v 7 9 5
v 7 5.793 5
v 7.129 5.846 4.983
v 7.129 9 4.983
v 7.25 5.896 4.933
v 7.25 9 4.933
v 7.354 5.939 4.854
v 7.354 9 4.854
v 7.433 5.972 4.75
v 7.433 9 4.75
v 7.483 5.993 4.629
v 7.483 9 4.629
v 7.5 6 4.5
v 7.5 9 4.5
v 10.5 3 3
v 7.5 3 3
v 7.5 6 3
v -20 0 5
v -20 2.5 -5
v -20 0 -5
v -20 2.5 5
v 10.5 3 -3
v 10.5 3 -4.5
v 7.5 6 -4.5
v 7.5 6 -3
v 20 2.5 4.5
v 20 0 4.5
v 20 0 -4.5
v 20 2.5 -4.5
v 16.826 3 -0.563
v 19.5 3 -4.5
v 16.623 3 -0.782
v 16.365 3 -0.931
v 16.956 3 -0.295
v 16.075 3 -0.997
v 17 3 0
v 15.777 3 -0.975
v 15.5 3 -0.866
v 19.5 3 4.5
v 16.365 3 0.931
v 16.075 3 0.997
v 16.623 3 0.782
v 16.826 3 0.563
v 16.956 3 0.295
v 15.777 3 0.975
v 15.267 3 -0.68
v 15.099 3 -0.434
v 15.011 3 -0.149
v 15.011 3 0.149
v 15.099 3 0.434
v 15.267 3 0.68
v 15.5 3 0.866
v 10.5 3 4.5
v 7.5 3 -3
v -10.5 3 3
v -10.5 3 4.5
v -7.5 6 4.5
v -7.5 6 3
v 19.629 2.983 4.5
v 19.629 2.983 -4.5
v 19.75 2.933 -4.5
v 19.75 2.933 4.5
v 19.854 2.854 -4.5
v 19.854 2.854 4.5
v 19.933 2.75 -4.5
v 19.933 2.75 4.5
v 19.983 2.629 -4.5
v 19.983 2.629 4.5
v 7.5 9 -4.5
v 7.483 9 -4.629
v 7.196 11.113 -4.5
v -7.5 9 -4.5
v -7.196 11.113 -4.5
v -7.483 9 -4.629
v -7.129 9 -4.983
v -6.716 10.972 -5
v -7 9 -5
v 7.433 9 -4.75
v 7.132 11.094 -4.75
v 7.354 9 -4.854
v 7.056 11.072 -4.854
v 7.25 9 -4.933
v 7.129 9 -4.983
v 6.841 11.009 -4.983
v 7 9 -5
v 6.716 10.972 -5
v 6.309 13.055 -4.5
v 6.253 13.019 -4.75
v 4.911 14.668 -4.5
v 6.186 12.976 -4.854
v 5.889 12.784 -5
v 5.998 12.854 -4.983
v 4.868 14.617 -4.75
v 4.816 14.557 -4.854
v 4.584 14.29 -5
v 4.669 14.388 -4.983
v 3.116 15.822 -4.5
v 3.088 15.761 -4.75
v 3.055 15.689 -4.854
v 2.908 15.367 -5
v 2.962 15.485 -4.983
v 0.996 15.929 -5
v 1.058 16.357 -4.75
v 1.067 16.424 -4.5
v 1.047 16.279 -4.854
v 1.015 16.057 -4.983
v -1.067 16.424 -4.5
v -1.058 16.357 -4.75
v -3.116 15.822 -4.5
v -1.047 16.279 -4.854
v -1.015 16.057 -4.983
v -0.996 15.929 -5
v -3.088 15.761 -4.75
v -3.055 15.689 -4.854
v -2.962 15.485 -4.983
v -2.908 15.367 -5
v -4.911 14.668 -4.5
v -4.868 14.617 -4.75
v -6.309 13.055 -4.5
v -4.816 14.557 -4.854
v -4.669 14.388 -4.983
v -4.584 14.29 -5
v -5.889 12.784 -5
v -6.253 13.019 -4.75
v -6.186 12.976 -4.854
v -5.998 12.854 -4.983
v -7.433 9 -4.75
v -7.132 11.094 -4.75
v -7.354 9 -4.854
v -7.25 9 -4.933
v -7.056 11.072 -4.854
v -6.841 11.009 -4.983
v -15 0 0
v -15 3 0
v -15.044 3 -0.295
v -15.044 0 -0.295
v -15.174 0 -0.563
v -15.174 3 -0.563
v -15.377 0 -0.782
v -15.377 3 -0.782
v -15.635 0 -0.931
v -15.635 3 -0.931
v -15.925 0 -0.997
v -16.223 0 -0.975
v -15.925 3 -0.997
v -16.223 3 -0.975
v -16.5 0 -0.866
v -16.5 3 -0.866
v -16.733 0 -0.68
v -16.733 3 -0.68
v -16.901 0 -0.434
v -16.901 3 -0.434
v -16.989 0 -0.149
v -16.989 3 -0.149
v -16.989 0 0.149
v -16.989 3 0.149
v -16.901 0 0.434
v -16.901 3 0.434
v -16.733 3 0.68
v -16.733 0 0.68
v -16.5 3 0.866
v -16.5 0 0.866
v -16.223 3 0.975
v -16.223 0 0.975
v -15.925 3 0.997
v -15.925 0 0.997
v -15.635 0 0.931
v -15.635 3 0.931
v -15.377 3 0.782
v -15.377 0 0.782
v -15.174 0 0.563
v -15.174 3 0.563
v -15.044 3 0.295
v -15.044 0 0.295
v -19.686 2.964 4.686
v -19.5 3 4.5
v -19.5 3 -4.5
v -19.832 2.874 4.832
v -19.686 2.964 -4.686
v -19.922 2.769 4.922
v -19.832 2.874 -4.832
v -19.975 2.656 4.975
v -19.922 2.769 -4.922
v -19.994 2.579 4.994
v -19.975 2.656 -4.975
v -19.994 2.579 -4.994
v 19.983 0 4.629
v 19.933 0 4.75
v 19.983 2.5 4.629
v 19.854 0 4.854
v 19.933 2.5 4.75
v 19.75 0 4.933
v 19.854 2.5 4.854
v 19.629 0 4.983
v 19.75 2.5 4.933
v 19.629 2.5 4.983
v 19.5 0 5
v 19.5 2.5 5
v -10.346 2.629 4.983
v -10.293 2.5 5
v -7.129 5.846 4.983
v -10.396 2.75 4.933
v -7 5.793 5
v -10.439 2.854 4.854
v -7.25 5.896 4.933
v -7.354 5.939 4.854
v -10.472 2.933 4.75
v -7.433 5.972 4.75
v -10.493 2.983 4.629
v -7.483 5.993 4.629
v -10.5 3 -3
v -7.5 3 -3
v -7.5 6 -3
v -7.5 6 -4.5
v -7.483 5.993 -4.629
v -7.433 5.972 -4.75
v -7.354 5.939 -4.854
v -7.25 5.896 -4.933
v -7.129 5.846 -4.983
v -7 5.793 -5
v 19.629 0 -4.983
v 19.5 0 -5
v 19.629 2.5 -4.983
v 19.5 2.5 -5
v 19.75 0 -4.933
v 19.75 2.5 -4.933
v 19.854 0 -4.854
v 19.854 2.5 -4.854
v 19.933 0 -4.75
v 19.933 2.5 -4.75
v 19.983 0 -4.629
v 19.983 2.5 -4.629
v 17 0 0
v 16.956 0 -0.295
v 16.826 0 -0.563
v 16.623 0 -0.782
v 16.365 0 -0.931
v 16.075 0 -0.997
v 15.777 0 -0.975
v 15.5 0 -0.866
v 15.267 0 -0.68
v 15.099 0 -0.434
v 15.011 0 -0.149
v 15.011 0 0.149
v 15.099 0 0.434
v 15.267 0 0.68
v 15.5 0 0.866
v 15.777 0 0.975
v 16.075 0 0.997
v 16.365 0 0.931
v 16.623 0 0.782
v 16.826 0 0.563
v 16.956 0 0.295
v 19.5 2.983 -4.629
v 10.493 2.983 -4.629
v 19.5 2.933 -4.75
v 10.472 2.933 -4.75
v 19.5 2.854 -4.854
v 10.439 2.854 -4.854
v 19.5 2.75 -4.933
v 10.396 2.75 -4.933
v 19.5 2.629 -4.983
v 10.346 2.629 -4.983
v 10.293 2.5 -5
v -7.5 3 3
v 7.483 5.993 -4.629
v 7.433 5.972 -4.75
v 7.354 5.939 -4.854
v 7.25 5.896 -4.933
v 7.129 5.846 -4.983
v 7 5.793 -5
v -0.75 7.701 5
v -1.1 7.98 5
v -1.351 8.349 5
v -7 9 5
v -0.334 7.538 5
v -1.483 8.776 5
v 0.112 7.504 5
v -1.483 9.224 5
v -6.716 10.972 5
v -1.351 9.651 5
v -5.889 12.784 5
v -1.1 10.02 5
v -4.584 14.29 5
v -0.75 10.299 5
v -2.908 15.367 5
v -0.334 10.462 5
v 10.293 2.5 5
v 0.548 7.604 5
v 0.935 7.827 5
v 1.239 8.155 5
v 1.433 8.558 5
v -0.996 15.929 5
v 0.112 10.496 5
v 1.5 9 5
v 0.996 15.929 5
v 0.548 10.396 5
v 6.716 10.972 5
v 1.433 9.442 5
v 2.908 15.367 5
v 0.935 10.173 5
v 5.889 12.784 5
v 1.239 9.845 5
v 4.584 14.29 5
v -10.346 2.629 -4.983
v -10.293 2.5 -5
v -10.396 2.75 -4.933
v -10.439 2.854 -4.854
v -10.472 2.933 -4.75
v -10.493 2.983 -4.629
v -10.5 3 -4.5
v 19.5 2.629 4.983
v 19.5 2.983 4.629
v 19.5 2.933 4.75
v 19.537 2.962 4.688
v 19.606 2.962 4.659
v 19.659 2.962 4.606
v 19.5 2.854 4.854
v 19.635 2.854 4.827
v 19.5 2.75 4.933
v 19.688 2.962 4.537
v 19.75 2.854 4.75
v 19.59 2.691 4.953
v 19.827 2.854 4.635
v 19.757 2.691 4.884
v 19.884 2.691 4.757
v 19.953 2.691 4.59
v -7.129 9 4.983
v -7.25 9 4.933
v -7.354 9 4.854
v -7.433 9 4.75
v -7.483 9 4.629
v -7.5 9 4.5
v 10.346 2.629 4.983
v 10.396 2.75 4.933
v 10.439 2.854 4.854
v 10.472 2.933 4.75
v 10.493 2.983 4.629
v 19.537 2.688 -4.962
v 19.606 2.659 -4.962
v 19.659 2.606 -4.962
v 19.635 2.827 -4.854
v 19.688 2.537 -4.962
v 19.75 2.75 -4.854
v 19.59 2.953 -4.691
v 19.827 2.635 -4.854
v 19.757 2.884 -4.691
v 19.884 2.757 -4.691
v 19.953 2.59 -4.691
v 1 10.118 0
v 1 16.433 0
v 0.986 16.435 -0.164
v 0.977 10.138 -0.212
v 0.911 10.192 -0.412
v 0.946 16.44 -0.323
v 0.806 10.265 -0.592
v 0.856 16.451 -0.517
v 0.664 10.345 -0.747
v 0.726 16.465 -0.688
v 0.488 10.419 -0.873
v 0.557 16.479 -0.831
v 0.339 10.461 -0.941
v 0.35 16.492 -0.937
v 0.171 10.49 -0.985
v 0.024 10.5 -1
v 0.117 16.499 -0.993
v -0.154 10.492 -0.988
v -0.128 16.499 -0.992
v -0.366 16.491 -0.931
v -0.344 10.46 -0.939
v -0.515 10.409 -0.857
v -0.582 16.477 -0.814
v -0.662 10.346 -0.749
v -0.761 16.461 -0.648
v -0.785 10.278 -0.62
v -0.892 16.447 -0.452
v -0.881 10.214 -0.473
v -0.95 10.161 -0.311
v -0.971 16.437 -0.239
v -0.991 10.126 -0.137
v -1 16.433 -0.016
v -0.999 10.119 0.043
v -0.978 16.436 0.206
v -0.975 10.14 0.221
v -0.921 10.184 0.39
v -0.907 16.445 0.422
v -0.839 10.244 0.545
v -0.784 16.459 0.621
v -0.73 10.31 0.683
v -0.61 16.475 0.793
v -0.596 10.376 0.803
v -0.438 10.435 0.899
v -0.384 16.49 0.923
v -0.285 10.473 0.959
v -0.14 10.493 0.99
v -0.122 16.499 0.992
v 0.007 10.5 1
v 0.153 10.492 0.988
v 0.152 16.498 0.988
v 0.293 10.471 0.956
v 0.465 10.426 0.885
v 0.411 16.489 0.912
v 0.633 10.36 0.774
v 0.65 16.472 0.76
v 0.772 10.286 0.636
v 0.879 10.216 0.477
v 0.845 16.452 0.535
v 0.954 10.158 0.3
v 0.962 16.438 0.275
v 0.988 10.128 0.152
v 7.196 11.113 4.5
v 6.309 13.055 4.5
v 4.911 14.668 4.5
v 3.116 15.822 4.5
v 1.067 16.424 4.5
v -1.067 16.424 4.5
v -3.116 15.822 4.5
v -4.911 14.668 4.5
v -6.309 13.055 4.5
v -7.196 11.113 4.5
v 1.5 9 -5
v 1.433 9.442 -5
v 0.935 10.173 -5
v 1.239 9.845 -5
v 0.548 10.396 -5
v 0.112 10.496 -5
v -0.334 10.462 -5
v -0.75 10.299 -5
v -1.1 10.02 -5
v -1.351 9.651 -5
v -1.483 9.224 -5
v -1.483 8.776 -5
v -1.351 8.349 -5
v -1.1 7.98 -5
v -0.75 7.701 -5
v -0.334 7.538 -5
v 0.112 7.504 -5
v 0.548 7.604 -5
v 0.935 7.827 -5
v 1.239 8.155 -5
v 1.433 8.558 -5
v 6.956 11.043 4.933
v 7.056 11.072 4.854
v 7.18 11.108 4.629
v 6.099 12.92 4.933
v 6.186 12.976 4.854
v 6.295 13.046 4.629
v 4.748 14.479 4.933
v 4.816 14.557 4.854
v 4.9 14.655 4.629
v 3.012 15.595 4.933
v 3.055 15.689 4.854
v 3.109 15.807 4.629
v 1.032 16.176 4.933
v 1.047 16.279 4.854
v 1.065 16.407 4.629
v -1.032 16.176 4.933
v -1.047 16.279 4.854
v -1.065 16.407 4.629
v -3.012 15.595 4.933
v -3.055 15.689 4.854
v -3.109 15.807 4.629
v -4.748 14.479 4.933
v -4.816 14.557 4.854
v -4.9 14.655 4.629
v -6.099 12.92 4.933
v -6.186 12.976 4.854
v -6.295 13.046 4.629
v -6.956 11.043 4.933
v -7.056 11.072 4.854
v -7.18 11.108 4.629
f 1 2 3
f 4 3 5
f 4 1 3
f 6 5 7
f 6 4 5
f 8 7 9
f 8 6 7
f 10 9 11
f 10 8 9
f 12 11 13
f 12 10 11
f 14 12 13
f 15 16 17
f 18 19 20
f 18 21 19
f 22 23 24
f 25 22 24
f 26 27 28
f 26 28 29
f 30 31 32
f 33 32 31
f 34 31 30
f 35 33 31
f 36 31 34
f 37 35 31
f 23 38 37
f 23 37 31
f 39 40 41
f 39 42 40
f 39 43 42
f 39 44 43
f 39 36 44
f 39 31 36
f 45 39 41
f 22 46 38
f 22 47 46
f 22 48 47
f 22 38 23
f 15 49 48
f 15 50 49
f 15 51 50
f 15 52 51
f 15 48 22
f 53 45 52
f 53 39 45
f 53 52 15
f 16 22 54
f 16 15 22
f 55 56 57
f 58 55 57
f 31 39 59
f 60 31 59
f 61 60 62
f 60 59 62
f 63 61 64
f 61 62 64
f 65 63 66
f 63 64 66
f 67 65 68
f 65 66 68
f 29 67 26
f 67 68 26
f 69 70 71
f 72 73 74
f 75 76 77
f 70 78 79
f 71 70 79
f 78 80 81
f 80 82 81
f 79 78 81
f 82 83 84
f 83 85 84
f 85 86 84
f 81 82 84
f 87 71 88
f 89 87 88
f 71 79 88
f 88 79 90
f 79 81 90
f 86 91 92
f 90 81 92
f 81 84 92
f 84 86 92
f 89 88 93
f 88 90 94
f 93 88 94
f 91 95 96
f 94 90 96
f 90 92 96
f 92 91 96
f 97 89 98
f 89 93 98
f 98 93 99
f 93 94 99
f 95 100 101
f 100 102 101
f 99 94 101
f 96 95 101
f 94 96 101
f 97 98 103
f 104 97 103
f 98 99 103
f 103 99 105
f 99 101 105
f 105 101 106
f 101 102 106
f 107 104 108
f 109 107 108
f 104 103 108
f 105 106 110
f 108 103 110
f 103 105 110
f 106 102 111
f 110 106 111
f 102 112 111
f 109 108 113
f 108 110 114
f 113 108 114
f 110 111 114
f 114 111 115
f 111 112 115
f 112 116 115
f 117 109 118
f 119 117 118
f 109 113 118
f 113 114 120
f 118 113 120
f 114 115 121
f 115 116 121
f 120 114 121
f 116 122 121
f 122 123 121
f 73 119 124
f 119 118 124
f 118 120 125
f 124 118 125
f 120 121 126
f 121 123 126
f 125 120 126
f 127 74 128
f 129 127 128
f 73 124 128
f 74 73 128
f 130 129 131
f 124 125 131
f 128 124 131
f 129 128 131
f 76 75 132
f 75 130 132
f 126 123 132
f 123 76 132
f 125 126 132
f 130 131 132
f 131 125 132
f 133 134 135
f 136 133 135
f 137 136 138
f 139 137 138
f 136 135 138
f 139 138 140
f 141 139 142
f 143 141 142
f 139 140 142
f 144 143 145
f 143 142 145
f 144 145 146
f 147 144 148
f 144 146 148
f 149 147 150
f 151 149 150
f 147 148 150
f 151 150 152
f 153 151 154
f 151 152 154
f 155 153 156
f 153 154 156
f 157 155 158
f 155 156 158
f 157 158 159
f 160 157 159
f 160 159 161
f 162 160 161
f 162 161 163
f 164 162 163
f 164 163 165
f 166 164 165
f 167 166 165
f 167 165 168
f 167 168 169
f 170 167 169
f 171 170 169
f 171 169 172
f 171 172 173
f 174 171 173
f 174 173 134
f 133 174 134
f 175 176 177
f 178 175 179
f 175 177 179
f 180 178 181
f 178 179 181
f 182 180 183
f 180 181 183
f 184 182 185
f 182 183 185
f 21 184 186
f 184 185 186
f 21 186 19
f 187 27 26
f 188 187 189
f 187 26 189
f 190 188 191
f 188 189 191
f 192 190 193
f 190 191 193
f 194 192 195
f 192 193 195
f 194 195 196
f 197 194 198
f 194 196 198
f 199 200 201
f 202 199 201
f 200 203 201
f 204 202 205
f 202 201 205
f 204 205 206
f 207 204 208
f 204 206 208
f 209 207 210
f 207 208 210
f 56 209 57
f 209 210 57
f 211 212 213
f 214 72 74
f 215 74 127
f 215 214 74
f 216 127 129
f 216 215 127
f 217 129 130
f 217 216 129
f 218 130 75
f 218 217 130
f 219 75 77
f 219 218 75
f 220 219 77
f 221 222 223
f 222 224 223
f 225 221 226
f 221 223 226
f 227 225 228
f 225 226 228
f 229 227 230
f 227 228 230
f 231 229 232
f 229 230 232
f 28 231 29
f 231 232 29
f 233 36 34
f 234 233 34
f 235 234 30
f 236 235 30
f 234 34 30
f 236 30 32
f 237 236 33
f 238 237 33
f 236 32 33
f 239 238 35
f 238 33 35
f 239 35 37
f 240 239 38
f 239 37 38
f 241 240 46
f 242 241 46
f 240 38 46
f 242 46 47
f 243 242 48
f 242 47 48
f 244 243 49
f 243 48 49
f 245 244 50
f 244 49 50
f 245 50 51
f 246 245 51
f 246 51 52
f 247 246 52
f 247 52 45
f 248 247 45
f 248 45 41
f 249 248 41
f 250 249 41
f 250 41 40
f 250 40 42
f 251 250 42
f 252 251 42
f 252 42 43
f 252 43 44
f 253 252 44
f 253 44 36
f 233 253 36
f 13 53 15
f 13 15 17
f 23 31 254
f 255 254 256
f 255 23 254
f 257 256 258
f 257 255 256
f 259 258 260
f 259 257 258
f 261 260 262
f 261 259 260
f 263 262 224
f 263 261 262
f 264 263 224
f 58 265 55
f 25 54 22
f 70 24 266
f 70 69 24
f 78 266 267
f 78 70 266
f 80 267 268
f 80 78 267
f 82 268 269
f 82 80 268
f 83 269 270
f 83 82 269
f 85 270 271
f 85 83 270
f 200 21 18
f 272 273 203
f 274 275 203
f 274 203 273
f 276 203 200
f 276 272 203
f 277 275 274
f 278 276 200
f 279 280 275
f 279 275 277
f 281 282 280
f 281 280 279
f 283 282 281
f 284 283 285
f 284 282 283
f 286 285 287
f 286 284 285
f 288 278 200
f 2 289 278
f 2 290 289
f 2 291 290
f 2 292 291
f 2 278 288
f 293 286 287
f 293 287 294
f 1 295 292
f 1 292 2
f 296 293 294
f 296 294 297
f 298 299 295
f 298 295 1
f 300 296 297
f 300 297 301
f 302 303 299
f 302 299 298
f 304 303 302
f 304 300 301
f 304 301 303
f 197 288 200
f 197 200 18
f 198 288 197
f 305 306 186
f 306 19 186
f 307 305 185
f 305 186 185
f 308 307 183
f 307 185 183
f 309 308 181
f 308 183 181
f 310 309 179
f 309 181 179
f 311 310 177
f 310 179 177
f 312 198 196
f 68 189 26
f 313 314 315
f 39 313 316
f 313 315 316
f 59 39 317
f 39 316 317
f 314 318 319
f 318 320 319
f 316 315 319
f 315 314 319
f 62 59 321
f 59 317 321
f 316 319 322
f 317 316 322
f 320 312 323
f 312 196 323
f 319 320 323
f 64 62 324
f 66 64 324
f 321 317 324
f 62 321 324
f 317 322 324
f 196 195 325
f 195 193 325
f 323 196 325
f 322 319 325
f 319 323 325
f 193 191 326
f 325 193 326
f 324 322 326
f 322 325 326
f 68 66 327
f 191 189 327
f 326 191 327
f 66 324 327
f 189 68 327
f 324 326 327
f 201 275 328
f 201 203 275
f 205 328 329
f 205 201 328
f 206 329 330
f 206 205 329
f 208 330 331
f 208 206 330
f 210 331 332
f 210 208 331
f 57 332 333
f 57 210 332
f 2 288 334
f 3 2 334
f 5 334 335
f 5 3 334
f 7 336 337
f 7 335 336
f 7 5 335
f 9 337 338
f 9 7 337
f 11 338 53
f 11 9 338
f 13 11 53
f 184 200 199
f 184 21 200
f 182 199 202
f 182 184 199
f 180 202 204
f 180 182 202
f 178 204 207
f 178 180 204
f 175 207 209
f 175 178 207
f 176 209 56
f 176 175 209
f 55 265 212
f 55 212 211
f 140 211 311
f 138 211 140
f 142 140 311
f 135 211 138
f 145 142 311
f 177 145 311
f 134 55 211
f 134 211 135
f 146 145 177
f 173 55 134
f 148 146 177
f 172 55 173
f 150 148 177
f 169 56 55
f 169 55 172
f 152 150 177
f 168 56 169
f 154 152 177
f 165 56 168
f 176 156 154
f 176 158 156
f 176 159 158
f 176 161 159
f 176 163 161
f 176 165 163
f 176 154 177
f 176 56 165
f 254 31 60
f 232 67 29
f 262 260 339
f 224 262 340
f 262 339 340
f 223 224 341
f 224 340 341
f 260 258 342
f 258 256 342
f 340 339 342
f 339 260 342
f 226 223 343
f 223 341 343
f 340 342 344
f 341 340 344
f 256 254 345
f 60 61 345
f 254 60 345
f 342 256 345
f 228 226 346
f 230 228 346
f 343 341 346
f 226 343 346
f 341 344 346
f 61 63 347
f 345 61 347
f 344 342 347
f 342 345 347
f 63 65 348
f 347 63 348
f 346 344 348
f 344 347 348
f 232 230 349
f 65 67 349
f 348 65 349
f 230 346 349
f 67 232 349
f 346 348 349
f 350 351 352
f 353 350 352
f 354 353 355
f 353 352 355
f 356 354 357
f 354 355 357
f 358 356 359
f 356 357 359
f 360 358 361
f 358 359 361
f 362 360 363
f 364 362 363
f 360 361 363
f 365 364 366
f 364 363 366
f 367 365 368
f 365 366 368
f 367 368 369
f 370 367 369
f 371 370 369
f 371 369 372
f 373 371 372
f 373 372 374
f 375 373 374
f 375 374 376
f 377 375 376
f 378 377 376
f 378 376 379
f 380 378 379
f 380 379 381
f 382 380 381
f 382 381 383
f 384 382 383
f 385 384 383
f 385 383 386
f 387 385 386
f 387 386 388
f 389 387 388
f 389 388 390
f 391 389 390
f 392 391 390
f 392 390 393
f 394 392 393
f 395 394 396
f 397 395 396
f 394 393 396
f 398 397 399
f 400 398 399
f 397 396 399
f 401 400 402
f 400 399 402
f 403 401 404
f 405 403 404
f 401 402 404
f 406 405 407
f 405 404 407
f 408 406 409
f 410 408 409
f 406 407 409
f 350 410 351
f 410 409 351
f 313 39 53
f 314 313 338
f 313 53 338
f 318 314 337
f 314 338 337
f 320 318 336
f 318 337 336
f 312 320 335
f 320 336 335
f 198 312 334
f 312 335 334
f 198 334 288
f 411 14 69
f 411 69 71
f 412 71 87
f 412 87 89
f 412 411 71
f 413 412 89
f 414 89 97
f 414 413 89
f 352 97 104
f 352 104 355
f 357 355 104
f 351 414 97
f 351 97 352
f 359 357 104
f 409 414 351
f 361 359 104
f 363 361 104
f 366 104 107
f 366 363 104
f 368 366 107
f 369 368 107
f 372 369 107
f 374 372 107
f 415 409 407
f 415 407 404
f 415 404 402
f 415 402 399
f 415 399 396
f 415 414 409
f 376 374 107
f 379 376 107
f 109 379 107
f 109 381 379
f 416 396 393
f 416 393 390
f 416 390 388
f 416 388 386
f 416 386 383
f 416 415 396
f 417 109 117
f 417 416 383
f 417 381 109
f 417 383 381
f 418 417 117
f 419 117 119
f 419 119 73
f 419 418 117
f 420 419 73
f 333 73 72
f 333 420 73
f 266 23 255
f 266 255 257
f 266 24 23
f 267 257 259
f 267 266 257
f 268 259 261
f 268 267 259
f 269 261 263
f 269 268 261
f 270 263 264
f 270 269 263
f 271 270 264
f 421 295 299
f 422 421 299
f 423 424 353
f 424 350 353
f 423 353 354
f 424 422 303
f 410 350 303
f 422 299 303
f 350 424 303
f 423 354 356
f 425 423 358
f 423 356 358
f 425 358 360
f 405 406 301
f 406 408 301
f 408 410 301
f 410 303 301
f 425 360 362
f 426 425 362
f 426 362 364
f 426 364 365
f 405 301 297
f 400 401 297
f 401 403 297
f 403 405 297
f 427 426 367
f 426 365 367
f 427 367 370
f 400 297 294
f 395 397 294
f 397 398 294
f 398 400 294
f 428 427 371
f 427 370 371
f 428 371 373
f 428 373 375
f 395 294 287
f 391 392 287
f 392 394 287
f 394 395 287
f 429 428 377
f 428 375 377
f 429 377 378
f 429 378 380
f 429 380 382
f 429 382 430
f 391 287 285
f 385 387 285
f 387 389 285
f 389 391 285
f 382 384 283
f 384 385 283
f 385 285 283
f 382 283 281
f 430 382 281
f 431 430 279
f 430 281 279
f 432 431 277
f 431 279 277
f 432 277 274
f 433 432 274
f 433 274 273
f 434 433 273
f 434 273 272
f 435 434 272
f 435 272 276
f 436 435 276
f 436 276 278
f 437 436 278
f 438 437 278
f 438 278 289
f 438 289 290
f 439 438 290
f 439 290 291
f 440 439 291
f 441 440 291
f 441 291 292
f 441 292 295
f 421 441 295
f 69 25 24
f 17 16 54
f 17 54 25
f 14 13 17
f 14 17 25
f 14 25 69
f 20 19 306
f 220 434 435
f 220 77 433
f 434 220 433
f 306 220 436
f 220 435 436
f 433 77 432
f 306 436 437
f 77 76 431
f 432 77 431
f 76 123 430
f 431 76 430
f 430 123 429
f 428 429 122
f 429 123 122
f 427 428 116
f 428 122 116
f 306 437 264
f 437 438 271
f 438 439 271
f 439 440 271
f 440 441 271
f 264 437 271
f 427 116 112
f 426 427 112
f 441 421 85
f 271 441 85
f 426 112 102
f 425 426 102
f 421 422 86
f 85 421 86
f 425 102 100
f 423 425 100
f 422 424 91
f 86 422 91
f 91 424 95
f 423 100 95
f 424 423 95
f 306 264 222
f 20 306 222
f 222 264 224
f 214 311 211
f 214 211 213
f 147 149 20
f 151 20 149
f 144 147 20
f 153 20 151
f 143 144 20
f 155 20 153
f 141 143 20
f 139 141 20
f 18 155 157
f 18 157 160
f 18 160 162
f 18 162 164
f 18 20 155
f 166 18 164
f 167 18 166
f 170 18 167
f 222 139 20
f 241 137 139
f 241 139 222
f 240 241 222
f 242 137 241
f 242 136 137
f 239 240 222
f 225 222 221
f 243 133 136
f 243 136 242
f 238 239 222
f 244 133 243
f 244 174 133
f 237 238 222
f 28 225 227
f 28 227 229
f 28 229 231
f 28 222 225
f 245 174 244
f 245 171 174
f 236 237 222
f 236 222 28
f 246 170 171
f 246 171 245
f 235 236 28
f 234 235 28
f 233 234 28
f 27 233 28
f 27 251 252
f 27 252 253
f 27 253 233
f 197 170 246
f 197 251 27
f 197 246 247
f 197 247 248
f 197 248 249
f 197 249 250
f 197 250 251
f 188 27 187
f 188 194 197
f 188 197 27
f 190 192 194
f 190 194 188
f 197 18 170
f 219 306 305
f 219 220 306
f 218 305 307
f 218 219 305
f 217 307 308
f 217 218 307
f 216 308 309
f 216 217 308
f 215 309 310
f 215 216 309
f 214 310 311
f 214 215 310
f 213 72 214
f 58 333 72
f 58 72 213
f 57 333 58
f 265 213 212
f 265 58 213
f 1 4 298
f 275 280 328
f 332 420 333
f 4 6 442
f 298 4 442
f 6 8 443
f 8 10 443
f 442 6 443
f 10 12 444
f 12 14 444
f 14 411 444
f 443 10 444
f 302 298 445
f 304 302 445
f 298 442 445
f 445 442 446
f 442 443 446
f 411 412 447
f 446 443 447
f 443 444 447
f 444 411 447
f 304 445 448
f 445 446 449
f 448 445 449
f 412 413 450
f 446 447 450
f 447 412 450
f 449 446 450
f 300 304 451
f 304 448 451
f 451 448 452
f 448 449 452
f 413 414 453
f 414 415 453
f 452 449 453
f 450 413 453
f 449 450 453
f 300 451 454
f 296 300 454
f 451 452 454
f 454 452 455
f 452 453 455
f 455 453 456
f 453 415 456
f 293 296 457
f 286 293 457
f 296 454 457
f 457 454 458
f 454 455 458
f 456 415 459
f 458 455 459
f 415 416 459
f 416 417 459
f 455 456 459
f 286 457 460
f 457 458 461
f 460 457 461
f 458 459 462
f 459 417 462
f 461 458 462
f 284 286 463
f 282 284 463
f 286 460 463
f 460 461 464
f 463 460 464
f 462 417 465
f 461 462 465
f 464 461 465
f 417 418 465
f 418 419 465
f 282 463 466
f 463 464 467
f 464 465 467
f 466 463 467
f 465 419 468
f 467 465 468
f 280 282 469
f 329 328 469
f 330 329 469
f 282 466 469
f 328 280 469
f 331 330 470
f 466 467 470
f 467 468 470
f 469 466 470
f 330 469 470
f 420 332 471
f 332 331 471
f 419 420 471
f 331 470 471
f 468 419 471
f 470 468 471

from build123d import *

# Parameters (mm, degrees)
BOSS_EXTRU_1_DEPTH           = 5
BOSS_EXTRU_2_DEPTH           = 2
SYM_TRIE2_COPY_1_DEPTH       = 2
CONG_1_R                     = 0.5
ESQUISSE4_R                  = 1.5
ENL_V_MAT_EXTRU_2_DEPTH      = 1.0000001
ENL_V_MAT_EXTRU_2_DEPTH_BACK = 11.0000001
ESQUISSE5_R                  = 1
ENL_V_MAT_EXTRU_3_DEPTH      = 7
ESQUISSE3_R                  = 1
ENL_V_MAT_EXTRU_1_DEPTH      = 14.500000115
ENL_V_MAT_EXTRU_1_DEPTH_BACK = 4


with BuildPart() as part:
    # Esquisse1 → Boss.-Extru.1 (new body, symmetric)
    with BuildSketch(Plane.XY):
        with BuildLine():
            Line((-20, 0), (20, 0))
            Line((20, 0), (20, 3))
            Line((20, 3), (7.5, 3))
            Line((7.5, 3), (7.5, 9))
            ThreePointArc((7.5, 9), (0, 16.5), (-7.5, 9))
            Line((-7.5, 9), (-7.5, 3))
            Line((-7.5, 3), (-20, 3))
            Line((-20, 3), (-20, 0))
        make_face()
    extrude(amount=BOSS_EXTRU_1_DEPTH, both=True)

    # Esquisse2 → Boss.-Extru.2 (add)
    with BuildSketch(Plane.XY.offset(5)):
        Polygon((-10.5, 3), (-7.5, 6), (-7.5, 3), align=None)
    boss_extru_2 = extrude(amount=-BOSS_EXTRU_2_DEPTH)

    # Symétrie1: Boss.-Extru.2 across plane
    add(boss_extru_2.mirror(Plane.XY))

    # Symétrie2: Boss.-Extru.2 across plane
    add(boss_extru_2.mirror(Plane(origin=(0, 0, 0), x_dir=(0, 0, 1), z_dir=(1, 0, 0))))

    # Symétrie2 copy 1 sketch → Symétrie2 copy 1 (add)
    with BuildSketch(Plane(origin=(0, 0, -5), x_dir=(-1, 0, 0), z_dir=(0, 0, -1))):
        Polygon((-10.5, 3), (-7.5, 6), (-7.5, 3), align=None)
    extrude(amount=-SYM_TRIE2_COPY_1_DEPTH)

    # Congé1
    cong_1_edges = [part.edges().sort_by_distance(p)[0] for p in [
        (20, 1.5, 5),
        (15.25, 3, 5),
        (-20, 3, 0),
        (20, 3, 0),
        (0, 16.5, 5),
        (-7.5, 7.5, 5),
        (-15.25, 3, 5),
        (-9, 4.5, 5),
        (-15.25, 3, -5),
        (-9, 4.5, -5),
        (7.5, 7.5, -5),
        (9, 4.5, -5),
        (7.5, 7.5, 5),
        (9, 4.5, 5),
        (-7.5, 7.5, -5),
        (0, 16.5, -5),
        (15.25, 3, -5),
        (20, 1.5, -5),
    ]]
    fillet(cong_1_edges, radius=CONG_1_R)

    # Esquisse4 → Enlèv. mat.-Extru.2 (cut, two sides)
    with BuildSketch(Plane.XY.offset(5)) as enl_v_mat_extru_2_sk:
        with Locations((0, 9)):
            Circle(ESQUISSE4_R)
    extrude(amount=ENL_V_MAT_EXTRU_2_DEPTH, mode=Mode.SUBTRACT)
    extrude(enl_v_mat_extru_2_sk.sketch, amount=-ENL_V_MAT_EXTRU_2_DEPTH_BACK, mode=Mode.SUBTRACT)

    # Esquisse5 → Enlèv. mat.-Extru.3 (cut)
    with BuildSketch(Plane(origin=(0, 16.5, 0), x_dir=(1, 0, 0), z_dir=(0, 1, 0))):
        Circle(ESQUISSE5_R)
    extrude(amount=-ENL_V_MAT_EXTRU_3_DEPTH, mode=Mode.SUBTRACT)

    # Esquisse3 → Enlèv. mat.-Extru.1 (cut, two sides)
    with BuildSketch(Plane(origin=(0, 3, 0), x_dir=(1, 0, 0), z_dir=(0, 1, 0))) as enl_v_mat_extru_1_sk:
        with Locations((-16, 0)):
            Circle(ESQUISSE3_R)
        with Locations((16, 0)):
            Circle(ESQUISSE3_R)
    extrude(amount=ENL_V_MAT_EXTRU_1_DEPTH, mode=Mode.SUBTRACT)
    extrude(enl_v_mat_extru_1_sk.sketch, amount=-ENL_V_MAT_EXTRU_1_DEPTH_BACK, mode=Mode.SUBTRACT)


solid = part.part
